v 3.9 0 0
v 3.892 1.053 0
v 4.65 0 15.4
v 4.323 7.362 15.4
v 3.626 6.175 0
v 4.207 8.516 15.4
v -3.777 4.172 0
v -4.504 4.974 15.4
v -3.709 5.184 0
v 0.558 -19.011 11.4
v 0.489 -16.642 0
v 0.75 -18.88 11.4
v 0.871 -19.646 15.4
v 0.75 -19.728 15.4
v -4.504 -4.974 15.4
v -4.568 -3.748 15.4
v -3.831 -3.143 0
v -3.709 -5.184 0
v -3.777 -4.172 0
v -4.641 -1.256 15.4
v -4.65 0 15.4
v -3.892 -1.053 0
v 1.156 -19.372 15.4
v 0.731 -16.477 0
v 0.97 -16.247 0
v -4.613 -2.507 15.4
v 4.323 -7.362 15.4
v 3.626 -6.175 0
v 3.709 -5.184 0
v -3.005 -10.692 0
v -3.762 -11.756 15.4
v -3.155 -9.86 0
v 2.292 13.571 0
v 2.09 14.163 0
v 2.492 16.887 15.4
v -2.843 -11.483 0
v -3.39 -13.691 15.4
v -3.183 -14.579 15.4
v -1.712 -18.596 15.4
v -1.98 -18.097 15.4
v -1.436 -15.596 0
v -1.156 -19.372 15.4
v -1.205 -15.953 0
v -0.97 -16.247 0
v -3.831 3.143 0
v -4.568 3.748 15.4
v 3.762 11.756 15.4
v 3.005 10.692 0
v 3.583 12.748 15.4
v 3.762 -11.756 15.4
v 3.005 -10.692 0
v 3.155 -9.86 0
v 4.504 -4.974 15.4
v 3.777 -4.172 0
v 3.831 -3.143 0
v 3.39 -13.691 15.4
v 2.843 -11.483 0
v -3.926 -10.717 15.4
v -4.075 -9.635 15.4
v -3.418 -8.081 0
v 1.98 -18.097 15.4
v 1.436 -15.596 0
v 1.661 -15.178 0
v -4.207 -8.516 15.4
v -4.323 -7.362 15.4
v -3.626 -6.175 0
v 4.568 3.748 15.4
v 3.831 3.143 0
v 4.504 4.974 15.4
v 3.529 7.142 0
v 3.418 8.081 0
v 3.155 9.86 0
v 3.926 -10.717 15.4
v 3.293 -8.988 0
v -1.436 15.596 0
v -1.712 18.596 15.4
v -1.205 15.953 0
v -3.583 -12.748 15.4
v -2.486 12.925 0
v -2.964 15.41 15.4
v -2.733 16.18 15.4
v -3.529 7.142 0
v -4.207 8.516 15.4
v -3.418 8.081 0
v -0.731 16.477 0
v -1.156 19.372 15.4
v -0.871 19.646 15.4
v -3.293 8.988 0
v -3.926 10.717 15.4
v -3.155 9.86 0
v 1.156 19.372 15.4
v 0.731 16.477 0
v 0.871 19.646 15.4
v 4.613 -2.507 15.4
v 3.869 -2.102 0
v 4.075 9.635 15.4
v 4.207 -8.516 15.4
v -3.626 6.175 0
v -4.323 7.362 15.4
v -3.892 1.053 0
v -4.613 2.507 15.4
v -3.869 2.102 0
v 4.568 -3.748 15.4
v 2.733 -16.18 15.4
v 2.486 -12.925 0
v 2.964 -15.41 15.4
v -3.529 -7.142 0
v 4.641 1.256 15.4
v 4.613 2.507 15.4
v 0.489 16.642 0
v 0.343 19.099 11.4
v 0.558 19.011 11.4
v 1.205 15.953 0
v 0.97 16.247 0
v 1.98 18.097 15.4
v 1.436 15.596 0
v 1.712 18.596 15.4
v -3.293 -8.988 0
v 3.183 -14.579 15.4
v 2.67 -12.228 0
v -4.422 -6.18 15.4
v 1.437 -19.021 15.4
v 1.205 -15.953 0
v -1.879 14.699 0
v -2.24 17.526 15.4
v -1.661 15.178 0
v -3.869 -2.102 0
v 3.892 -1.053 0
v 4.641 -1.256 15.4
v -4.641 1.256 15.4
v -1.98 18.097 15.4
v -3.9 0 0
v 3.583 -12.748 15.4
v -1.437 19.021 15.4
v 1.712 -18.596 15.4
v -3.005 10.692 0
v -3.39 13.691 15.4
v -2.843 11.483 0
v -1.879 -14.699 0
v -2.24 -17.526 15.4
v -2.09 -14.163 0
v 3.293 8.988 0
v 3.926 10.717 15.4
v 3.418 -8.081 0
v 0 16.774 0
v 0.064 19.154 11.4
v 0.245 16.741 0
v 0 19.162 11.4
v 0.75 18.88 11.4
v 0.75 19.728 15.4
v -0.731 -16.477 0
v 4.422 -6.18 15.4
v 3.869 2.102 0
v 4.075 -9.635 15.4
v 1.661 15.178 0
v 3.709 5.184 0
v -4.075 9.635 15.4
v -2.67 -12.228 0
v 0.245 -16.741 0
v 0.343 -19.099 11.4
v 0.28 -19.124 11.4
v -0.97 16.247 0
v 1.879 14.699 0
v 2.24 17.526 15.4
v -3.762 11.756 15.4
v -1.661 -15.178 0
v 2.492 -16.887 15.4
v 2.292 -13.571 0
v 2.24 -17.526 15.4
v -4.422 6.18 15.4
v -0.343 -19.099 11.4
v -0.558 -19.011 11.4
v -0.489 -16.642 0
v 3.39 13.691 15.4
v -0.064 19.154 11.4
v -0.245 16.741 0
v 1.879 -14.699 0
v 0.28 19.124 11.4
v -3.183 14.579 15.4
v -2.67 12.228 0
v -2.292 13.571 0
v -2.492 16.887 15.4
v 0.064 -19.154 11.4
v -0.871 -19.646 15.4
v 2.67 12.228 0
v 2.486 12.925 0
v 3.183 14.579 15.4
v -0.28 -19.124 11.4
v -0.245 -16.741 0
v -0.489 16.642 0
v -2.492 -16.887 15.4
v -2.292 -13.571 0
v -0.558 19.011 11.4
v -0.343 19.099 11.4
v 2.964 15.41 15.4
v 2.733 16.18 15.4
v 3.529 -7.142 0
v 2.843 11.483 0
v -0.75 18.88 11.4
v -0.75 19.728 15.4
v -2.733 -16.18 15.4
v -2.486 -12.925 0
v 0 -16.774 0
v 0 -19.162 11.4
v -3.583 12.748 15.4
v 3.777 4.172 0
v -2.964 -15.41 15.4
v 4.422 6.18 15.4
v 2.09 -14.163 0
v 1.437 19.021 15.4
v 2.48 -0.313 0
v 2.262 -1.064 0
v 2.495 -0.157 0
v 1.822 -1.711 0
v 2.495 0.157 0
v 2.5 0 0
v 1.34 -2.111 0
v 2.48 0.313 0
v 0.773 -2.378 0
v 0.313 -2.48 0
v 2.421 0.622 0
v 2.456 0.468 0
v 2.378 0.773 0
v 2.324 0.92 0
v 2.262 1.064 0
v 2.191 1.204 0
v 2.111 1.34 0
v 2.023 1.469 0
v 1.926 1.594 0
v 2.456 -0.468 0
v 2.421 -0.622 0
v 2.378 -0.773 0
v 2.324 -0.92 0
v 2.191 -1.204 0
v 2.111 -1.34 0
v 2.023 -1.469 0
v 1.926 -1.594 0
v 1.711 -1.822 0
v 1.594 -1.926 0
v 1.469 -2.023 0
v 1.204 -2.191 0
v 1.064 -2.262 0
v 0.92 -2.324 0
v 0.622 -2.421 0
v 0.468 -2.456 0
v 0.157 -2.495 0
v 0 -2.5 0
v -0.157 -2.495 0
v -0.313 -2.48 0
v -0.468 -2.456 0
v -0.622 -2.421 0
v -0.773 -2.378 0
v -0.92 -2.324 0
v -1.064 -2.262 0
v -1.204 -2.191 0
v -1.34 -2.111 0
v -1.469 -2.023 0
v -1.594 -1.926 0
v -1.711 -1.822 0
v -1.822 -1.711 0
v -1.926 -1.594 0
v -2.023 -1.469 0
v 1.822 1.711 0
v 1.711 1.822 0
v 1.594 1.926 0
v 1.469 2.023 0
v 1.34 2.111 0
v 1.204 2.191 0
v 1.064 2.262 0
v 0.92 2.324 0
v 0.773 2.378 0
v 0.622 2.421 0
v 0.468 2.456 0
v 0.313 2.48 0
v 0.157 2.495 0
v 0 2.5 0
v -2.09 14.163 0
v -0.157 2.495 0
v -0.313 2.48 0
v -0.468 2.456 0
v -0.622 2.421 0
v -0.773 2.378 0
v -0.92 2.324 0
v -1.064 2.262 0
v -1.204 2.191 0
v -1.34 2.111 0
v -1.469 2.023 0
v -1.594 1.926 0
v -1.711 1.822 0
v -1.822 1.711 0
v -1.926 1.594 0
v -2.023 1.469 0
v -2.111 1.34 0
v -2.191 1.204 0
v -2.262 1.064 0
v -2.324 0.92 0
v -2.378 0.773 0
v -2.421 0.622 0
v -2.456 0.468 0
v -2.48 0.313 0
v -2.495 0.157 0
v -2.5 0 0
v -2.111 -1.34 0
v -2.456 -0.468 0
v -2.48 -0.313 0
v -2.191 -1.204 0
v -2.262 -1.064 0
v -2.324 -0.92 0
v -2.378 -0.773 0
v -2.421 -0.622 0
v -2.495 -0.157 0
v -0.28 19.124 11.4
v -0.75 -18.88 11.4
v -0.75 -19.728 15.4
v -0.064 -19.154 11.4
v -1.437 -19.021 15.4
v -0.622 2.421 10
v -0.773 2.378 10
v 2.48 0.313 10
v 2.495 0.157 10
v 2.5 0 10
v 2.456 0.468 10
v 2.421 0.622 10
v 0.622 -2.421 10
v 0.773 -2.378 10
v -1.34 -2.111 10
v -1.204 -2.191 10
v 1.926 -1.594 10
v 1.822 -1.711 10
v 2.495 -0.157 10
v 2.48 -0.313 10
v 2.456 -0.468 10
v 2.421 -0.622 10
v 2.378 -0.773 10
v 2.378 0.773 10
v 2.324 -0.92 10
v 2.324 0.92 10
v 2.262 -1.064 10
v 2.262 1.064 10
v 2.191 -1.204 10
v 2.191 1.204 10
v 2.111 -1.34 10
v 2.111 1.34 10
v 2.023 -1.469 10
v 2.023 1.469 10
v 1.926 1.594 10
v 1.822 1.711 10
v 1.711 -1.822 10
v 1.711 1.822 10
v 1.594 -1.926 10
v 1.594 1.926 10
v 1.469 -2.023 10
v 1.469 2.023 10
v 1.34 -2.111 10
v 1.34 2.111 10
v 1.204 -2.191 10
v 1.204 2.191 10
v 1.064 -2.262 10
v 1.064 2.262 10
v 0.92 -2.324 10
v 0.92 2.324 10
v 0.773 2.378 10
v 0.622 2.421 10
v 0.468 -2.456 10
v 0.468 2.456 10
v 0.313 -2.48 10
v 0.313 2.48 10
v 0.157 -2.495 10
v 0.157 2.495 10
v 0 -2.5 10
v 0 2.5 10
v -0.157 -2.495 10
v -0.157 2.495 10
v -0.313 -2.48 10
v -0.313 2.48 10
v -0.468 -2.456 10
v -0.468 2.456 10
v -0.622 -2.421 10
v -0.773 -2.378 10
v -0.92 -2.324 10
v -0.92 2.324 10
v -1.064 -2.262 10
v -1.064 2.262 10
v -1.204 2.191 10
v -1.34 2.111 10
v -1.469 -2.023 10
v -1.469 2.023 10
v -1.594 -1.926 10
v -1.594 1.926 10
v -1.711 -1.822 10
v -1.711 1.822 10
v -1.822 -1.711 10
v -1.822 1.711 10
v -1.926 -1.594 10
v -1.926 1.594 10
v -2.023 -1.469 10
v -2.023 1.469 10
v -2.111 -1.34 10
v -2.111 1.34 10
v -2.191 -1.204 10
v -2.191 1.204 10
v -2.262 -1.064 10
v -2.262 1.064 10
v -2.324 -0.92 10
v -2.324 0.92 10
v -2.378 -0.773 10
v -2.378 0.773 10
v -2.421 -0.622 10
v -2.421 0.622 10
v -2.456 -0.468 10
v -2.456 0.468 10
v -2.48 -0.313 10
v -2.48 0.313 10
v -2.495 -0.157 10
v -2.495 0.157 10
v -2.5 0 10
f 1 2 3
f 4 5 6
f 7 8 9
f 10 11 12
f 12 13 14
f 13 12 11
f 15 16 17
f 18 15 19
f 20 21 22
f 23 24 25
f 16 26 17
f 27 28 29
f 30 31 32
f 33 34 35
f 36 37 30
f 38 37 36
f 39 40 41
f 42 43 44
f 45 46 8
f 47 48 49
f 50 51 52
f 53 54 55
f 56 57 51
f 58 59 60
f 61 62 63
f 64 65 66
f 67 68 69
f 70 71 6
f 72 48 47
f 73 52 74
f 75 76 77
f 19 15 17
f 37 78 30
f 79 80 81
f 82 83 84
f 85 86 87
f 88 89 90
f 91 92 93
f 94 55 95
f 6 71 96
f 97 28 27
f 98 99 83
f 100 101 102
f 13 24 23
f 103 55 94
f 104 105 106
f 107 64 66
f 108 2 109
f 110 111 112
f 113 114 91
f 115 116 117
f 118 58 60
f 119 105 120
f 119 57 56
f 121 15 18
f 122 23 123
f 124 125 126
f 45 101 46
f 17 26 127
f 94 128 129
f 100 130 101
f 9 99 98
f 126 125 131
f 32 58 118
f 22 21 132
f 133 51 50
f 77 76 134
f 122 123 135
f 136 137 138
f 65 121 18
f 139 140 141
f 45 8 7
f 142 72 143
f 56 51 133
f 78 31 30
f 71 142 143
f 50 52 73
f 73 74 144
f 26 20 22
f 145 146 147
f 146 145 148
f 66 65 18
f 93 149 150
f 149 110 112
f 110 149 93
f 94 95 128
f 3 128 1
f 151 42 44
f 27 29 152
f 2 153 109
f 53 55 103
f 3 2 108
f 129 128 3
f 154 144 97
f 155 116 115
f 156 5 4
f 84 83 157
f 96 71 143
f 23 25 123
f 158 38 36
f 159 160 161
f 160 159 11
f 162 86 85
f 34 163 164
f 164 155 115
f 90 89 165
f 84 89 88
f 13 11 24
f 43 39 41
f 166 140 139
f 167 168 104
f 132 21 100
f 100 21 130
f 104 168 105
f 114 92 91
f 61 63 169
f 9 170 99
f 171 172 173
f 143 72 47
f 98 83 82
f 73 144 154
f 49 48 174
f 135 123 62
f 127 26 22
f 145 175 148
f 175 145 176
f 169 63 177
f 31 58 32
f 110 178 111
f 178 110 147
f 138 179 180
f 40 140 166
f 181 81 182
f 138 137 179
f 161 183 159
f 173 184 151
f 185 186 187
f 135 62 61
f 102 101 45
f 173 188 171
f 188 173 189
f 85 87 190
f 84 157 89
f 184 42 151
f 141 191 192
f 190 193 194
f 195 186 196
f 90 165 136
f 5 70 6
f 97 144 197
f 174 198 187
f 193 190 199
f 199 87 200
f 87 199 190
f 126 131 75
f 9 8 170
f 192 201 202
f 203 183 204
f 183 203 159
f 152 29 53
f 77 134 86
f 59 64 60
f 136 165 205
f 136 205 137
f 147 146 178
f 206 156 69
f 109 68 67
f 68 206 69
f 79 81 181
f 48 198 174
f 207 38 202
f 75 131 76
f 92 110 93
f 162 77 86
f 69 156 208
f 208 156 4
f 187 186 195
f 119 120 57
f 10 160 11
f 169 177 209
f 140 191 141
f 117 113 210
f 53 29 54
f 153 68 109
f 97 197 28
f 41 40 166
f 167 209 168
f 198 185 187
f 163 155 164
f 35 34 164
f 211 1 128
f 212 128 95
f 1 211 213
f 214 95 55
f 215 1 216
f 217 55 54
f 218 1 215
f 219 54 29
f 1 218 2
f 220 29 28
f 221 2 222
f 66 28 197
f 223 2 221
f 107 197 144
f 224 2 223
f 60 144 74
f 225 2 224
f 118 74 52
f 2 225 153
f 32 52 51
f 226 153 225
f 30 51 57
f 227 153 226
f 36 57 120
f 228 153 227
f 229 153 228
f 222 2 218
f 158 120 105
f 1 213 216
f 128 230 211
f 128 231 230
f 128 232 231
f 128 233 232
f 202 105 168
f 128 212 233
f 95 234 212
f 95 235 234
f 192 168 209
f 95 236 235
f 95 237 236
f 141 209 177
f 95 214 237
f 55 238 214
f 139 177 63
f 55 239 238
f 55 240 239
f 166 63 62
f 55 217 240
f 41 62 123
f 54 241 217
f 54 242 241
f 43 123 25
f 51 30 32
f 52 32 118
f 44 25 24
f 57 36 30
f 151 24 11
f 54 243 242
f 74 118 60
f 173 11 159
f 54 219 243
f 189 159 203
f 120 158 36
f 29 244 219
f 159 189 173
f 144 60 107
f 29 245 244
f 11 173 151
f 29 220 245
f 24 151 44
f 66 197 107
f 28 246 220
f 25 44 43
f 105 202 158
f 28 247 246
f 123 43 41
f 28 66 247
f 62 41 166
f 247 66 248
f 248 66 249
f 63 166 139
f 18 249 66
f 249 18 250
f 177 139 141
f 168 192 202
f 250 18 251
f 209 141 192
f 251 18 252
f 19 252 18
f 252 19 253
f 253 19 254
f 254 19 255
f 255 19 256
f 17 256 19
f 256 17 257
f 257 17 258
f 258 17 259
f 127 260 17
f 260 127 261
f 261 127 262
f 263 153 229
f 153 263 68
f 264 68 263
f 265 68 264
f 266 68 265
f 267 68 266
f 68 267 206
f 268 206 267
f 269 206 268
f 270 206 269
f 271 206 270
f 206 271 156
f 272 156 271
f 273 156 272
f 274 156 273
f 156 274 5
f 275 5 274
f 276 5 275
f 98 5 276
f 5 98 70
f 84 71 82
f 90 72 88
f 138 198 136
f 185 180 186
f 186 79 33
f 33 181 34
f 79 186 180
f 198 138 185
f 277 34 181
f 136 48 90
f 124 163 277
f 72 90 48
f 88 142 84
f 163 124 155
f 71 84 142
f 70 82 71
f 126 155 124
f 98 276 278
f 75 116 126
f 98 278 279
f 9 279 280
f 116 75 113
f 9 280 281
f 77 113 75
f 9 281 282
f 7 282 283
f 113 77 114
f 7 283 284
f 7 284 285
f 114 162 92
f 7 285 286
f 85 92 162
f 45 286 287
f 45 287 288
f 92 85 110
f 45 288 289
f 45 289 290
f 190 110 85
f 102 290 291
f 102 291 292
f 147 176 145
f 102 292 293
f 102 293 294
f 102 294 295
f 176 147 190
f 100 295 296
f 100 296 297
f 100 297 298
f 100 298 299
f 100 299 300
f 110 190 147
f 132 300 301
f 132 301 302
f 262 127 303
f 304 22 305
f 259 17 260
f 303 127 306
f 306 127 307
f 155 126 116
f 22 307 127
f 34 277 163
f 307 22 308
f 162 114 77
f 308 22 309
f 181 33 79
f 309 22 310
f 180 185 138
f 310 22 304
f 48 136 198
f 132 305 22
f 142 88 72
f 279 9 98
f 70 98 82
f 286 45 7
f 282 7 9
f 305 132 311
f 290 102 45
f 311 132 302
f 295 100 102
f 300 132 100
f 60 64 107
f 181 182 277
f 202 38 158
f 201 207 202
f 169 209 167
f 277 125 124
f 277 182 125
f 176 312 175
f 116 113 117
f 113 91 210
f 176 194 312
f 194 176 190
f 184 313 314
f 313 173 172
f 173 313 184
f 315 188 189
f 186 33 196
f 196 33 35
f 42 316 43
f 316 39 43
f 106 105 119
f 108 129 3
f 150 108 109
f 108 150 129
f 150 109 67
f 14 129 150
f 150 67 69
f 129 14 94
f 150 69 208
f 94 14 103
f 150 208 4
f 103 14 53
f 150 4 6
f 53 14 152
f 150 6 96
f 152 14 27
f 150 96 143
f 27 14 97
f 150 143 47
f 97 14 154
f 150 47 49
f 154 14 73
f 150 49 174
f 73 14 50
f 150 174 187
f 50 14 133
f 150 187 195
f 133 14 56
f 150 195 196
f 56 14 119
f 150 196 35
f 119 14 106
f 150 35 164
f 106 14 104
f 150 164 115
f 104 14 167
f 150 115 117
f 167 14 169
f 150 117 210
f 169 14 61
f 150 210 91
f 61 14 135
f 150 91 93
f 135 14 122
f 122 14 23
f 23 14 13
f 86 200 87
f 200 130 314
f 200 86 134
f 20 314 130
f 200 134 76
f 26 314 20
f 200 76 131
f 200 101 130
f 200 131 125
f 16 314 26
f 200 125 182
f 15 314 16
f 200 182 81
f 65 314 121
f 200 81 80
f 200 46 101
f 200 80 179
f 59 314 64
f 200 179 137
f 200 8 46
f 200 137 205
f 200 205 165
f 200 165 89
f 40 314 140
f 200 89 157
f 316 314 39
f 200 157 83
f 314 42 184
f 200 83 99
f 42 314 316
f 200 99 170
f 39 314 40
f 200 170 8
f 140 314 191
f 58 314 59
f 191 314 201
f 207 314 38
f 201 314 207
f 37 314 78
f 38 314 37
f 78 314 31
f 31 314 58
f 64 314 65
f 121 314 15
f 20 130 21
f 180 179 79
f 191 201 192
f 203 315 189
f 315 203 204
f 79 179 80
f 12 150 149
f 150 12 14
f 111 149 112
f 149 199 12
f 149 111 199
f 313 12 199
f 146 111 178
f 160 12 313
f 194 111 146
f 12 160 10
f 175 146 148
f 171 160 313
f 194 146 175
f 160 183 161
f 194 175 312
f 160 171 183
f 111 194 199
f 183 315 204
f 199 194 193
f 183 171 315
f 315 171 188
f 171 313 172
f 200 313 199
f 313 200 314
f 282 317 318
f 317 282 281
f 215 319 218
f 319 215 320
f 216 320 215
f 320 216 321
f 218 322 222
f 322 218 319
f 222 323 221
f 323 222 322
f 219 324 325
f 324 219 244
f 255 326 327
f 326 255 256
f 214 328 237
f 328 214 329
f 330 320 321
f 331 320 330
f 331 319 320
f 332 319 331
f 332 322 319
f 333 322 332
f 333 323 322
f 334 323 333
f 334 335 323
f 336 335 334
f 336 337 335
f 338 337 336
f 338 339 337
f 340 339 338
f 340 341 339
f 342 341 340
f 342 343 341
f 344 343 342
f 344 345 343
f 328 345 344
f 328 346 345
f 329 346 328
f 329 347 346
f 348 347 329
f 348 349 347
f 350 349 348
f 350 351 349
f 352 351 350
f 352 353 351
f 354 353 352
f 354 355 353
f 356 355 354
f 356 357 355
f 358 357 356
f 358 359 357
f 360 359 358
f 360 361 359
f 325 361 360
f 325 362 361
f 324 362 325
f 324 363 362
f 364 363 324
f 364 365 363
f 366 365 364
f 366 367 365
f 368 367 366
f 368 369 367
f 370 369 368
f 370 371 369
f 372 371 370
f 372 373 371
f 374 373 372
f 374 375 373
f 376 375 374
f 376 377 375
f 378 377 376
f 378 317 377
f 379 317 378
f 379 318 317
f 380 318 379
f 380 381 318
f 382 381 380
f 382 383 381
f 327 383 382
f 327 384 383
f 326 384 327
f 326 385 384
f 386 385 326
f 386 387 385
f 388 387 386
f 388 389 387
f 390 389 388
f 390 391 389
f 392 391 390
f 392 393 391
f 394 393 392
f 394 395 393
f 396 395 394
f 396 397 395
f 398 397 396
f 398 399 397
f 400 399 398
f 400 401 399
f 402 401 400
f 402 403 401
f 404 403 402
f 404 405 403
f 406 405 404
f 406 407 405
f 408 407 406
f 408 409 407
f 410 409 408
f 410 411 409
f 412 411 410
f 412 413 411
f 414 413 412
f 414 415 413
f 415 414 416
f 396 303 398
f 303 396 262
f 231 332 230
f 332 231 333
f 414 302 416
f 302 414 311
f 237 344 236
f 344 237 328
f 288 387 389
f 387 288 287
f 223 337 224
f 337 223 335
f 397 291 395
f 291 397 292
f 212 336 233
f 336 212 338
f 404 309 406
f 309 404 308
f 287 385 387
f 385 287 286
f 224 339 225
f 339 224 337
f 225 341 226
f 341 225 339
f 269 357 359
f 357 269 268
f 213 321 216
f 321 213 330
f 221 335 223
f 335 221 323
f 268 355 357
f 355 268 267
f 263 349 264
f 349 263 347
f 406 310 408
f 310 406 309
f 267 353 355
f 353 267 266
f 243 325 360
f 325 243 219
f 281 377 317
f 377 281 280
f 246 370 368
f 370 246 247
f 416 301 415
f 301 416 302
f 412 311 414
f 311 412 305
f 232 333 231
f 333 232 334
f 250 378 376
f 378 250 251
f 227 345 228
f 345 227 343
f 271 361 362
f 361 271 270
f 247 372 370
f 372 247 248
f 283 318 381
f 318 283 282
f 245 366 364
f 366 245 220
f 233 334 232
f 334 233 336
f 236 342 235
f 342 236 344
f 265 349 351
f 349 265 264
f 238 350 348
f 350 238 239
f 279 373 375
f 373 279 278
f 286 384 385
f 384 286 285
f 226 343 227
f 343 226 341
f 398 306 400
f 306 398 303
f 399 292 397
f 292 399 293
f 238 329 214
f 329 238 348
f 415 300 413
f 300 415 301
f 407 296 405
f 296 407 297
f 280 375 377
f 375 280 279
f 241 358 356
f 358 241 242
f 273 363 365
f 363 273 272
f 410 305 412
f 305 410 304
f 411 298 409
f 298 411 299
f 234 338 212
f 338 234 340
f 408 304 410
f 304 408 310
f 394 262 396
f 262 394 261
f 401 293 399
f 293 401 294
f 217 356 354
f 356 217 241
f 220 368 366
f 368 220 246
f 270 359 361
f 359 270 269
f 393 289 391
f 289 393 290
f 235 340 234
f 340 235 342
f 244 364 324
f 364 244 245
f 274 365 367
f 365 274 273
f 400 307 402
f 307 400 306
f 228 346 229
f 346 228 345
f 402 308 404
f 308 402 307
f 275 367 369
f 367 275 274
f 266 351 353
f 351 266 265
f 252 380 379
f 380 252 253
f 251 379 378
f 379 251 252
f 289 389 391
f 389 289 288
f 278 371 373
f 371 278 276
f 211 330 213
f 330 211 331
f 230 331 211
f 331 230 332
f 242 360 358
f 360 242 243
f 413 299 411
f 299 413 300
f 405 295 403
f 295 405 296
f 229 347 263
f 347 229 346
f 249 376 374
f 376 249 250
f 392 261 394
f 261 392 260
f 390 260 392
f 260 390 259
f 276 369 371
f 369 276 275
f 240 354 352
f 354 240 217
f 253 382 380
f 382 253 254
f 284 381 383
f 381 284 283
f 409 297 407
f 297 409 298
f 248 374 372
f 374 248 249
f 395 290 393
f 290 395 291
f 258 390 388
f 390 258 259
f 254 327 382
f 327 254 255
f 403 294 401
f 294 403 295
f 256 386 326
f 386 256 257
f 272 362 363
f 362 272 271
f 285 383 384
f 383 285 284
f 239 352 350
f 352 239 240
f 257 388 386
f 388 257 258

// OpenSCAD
$fn = 100;

stabDurchmesser = 5;
wandStaerke = 1.4;
fotoDicke = 1.5;
fotoBreite = 40;
fotoTiefe = 4;

difference(){
    resize([0,fotoBreite,0])
        translate([0,0,stabDurchmesser+fotoTiefe/2+wandStaerke/2])
            cylinder(h = stabDurchmesser*2+fotoTiefe+wandStaerke, r1 = wandStaerke + stabDurchmesser/2, r2 = fotoDicke/2 + wandStaerke + stabDurchmesser/2, center = true);
    translate([0,0,2*stabDurchmesser+wandStaerke+fotoTiefe/2])
        cube([fotoDicke, fotoBreite+1, fotoTiefe], center = true);
    translate([0,0,stabDurchmesser])    
        cylinder(h = 2*stabDurchmesser, d = stabDurchmesser, center = true);
}
